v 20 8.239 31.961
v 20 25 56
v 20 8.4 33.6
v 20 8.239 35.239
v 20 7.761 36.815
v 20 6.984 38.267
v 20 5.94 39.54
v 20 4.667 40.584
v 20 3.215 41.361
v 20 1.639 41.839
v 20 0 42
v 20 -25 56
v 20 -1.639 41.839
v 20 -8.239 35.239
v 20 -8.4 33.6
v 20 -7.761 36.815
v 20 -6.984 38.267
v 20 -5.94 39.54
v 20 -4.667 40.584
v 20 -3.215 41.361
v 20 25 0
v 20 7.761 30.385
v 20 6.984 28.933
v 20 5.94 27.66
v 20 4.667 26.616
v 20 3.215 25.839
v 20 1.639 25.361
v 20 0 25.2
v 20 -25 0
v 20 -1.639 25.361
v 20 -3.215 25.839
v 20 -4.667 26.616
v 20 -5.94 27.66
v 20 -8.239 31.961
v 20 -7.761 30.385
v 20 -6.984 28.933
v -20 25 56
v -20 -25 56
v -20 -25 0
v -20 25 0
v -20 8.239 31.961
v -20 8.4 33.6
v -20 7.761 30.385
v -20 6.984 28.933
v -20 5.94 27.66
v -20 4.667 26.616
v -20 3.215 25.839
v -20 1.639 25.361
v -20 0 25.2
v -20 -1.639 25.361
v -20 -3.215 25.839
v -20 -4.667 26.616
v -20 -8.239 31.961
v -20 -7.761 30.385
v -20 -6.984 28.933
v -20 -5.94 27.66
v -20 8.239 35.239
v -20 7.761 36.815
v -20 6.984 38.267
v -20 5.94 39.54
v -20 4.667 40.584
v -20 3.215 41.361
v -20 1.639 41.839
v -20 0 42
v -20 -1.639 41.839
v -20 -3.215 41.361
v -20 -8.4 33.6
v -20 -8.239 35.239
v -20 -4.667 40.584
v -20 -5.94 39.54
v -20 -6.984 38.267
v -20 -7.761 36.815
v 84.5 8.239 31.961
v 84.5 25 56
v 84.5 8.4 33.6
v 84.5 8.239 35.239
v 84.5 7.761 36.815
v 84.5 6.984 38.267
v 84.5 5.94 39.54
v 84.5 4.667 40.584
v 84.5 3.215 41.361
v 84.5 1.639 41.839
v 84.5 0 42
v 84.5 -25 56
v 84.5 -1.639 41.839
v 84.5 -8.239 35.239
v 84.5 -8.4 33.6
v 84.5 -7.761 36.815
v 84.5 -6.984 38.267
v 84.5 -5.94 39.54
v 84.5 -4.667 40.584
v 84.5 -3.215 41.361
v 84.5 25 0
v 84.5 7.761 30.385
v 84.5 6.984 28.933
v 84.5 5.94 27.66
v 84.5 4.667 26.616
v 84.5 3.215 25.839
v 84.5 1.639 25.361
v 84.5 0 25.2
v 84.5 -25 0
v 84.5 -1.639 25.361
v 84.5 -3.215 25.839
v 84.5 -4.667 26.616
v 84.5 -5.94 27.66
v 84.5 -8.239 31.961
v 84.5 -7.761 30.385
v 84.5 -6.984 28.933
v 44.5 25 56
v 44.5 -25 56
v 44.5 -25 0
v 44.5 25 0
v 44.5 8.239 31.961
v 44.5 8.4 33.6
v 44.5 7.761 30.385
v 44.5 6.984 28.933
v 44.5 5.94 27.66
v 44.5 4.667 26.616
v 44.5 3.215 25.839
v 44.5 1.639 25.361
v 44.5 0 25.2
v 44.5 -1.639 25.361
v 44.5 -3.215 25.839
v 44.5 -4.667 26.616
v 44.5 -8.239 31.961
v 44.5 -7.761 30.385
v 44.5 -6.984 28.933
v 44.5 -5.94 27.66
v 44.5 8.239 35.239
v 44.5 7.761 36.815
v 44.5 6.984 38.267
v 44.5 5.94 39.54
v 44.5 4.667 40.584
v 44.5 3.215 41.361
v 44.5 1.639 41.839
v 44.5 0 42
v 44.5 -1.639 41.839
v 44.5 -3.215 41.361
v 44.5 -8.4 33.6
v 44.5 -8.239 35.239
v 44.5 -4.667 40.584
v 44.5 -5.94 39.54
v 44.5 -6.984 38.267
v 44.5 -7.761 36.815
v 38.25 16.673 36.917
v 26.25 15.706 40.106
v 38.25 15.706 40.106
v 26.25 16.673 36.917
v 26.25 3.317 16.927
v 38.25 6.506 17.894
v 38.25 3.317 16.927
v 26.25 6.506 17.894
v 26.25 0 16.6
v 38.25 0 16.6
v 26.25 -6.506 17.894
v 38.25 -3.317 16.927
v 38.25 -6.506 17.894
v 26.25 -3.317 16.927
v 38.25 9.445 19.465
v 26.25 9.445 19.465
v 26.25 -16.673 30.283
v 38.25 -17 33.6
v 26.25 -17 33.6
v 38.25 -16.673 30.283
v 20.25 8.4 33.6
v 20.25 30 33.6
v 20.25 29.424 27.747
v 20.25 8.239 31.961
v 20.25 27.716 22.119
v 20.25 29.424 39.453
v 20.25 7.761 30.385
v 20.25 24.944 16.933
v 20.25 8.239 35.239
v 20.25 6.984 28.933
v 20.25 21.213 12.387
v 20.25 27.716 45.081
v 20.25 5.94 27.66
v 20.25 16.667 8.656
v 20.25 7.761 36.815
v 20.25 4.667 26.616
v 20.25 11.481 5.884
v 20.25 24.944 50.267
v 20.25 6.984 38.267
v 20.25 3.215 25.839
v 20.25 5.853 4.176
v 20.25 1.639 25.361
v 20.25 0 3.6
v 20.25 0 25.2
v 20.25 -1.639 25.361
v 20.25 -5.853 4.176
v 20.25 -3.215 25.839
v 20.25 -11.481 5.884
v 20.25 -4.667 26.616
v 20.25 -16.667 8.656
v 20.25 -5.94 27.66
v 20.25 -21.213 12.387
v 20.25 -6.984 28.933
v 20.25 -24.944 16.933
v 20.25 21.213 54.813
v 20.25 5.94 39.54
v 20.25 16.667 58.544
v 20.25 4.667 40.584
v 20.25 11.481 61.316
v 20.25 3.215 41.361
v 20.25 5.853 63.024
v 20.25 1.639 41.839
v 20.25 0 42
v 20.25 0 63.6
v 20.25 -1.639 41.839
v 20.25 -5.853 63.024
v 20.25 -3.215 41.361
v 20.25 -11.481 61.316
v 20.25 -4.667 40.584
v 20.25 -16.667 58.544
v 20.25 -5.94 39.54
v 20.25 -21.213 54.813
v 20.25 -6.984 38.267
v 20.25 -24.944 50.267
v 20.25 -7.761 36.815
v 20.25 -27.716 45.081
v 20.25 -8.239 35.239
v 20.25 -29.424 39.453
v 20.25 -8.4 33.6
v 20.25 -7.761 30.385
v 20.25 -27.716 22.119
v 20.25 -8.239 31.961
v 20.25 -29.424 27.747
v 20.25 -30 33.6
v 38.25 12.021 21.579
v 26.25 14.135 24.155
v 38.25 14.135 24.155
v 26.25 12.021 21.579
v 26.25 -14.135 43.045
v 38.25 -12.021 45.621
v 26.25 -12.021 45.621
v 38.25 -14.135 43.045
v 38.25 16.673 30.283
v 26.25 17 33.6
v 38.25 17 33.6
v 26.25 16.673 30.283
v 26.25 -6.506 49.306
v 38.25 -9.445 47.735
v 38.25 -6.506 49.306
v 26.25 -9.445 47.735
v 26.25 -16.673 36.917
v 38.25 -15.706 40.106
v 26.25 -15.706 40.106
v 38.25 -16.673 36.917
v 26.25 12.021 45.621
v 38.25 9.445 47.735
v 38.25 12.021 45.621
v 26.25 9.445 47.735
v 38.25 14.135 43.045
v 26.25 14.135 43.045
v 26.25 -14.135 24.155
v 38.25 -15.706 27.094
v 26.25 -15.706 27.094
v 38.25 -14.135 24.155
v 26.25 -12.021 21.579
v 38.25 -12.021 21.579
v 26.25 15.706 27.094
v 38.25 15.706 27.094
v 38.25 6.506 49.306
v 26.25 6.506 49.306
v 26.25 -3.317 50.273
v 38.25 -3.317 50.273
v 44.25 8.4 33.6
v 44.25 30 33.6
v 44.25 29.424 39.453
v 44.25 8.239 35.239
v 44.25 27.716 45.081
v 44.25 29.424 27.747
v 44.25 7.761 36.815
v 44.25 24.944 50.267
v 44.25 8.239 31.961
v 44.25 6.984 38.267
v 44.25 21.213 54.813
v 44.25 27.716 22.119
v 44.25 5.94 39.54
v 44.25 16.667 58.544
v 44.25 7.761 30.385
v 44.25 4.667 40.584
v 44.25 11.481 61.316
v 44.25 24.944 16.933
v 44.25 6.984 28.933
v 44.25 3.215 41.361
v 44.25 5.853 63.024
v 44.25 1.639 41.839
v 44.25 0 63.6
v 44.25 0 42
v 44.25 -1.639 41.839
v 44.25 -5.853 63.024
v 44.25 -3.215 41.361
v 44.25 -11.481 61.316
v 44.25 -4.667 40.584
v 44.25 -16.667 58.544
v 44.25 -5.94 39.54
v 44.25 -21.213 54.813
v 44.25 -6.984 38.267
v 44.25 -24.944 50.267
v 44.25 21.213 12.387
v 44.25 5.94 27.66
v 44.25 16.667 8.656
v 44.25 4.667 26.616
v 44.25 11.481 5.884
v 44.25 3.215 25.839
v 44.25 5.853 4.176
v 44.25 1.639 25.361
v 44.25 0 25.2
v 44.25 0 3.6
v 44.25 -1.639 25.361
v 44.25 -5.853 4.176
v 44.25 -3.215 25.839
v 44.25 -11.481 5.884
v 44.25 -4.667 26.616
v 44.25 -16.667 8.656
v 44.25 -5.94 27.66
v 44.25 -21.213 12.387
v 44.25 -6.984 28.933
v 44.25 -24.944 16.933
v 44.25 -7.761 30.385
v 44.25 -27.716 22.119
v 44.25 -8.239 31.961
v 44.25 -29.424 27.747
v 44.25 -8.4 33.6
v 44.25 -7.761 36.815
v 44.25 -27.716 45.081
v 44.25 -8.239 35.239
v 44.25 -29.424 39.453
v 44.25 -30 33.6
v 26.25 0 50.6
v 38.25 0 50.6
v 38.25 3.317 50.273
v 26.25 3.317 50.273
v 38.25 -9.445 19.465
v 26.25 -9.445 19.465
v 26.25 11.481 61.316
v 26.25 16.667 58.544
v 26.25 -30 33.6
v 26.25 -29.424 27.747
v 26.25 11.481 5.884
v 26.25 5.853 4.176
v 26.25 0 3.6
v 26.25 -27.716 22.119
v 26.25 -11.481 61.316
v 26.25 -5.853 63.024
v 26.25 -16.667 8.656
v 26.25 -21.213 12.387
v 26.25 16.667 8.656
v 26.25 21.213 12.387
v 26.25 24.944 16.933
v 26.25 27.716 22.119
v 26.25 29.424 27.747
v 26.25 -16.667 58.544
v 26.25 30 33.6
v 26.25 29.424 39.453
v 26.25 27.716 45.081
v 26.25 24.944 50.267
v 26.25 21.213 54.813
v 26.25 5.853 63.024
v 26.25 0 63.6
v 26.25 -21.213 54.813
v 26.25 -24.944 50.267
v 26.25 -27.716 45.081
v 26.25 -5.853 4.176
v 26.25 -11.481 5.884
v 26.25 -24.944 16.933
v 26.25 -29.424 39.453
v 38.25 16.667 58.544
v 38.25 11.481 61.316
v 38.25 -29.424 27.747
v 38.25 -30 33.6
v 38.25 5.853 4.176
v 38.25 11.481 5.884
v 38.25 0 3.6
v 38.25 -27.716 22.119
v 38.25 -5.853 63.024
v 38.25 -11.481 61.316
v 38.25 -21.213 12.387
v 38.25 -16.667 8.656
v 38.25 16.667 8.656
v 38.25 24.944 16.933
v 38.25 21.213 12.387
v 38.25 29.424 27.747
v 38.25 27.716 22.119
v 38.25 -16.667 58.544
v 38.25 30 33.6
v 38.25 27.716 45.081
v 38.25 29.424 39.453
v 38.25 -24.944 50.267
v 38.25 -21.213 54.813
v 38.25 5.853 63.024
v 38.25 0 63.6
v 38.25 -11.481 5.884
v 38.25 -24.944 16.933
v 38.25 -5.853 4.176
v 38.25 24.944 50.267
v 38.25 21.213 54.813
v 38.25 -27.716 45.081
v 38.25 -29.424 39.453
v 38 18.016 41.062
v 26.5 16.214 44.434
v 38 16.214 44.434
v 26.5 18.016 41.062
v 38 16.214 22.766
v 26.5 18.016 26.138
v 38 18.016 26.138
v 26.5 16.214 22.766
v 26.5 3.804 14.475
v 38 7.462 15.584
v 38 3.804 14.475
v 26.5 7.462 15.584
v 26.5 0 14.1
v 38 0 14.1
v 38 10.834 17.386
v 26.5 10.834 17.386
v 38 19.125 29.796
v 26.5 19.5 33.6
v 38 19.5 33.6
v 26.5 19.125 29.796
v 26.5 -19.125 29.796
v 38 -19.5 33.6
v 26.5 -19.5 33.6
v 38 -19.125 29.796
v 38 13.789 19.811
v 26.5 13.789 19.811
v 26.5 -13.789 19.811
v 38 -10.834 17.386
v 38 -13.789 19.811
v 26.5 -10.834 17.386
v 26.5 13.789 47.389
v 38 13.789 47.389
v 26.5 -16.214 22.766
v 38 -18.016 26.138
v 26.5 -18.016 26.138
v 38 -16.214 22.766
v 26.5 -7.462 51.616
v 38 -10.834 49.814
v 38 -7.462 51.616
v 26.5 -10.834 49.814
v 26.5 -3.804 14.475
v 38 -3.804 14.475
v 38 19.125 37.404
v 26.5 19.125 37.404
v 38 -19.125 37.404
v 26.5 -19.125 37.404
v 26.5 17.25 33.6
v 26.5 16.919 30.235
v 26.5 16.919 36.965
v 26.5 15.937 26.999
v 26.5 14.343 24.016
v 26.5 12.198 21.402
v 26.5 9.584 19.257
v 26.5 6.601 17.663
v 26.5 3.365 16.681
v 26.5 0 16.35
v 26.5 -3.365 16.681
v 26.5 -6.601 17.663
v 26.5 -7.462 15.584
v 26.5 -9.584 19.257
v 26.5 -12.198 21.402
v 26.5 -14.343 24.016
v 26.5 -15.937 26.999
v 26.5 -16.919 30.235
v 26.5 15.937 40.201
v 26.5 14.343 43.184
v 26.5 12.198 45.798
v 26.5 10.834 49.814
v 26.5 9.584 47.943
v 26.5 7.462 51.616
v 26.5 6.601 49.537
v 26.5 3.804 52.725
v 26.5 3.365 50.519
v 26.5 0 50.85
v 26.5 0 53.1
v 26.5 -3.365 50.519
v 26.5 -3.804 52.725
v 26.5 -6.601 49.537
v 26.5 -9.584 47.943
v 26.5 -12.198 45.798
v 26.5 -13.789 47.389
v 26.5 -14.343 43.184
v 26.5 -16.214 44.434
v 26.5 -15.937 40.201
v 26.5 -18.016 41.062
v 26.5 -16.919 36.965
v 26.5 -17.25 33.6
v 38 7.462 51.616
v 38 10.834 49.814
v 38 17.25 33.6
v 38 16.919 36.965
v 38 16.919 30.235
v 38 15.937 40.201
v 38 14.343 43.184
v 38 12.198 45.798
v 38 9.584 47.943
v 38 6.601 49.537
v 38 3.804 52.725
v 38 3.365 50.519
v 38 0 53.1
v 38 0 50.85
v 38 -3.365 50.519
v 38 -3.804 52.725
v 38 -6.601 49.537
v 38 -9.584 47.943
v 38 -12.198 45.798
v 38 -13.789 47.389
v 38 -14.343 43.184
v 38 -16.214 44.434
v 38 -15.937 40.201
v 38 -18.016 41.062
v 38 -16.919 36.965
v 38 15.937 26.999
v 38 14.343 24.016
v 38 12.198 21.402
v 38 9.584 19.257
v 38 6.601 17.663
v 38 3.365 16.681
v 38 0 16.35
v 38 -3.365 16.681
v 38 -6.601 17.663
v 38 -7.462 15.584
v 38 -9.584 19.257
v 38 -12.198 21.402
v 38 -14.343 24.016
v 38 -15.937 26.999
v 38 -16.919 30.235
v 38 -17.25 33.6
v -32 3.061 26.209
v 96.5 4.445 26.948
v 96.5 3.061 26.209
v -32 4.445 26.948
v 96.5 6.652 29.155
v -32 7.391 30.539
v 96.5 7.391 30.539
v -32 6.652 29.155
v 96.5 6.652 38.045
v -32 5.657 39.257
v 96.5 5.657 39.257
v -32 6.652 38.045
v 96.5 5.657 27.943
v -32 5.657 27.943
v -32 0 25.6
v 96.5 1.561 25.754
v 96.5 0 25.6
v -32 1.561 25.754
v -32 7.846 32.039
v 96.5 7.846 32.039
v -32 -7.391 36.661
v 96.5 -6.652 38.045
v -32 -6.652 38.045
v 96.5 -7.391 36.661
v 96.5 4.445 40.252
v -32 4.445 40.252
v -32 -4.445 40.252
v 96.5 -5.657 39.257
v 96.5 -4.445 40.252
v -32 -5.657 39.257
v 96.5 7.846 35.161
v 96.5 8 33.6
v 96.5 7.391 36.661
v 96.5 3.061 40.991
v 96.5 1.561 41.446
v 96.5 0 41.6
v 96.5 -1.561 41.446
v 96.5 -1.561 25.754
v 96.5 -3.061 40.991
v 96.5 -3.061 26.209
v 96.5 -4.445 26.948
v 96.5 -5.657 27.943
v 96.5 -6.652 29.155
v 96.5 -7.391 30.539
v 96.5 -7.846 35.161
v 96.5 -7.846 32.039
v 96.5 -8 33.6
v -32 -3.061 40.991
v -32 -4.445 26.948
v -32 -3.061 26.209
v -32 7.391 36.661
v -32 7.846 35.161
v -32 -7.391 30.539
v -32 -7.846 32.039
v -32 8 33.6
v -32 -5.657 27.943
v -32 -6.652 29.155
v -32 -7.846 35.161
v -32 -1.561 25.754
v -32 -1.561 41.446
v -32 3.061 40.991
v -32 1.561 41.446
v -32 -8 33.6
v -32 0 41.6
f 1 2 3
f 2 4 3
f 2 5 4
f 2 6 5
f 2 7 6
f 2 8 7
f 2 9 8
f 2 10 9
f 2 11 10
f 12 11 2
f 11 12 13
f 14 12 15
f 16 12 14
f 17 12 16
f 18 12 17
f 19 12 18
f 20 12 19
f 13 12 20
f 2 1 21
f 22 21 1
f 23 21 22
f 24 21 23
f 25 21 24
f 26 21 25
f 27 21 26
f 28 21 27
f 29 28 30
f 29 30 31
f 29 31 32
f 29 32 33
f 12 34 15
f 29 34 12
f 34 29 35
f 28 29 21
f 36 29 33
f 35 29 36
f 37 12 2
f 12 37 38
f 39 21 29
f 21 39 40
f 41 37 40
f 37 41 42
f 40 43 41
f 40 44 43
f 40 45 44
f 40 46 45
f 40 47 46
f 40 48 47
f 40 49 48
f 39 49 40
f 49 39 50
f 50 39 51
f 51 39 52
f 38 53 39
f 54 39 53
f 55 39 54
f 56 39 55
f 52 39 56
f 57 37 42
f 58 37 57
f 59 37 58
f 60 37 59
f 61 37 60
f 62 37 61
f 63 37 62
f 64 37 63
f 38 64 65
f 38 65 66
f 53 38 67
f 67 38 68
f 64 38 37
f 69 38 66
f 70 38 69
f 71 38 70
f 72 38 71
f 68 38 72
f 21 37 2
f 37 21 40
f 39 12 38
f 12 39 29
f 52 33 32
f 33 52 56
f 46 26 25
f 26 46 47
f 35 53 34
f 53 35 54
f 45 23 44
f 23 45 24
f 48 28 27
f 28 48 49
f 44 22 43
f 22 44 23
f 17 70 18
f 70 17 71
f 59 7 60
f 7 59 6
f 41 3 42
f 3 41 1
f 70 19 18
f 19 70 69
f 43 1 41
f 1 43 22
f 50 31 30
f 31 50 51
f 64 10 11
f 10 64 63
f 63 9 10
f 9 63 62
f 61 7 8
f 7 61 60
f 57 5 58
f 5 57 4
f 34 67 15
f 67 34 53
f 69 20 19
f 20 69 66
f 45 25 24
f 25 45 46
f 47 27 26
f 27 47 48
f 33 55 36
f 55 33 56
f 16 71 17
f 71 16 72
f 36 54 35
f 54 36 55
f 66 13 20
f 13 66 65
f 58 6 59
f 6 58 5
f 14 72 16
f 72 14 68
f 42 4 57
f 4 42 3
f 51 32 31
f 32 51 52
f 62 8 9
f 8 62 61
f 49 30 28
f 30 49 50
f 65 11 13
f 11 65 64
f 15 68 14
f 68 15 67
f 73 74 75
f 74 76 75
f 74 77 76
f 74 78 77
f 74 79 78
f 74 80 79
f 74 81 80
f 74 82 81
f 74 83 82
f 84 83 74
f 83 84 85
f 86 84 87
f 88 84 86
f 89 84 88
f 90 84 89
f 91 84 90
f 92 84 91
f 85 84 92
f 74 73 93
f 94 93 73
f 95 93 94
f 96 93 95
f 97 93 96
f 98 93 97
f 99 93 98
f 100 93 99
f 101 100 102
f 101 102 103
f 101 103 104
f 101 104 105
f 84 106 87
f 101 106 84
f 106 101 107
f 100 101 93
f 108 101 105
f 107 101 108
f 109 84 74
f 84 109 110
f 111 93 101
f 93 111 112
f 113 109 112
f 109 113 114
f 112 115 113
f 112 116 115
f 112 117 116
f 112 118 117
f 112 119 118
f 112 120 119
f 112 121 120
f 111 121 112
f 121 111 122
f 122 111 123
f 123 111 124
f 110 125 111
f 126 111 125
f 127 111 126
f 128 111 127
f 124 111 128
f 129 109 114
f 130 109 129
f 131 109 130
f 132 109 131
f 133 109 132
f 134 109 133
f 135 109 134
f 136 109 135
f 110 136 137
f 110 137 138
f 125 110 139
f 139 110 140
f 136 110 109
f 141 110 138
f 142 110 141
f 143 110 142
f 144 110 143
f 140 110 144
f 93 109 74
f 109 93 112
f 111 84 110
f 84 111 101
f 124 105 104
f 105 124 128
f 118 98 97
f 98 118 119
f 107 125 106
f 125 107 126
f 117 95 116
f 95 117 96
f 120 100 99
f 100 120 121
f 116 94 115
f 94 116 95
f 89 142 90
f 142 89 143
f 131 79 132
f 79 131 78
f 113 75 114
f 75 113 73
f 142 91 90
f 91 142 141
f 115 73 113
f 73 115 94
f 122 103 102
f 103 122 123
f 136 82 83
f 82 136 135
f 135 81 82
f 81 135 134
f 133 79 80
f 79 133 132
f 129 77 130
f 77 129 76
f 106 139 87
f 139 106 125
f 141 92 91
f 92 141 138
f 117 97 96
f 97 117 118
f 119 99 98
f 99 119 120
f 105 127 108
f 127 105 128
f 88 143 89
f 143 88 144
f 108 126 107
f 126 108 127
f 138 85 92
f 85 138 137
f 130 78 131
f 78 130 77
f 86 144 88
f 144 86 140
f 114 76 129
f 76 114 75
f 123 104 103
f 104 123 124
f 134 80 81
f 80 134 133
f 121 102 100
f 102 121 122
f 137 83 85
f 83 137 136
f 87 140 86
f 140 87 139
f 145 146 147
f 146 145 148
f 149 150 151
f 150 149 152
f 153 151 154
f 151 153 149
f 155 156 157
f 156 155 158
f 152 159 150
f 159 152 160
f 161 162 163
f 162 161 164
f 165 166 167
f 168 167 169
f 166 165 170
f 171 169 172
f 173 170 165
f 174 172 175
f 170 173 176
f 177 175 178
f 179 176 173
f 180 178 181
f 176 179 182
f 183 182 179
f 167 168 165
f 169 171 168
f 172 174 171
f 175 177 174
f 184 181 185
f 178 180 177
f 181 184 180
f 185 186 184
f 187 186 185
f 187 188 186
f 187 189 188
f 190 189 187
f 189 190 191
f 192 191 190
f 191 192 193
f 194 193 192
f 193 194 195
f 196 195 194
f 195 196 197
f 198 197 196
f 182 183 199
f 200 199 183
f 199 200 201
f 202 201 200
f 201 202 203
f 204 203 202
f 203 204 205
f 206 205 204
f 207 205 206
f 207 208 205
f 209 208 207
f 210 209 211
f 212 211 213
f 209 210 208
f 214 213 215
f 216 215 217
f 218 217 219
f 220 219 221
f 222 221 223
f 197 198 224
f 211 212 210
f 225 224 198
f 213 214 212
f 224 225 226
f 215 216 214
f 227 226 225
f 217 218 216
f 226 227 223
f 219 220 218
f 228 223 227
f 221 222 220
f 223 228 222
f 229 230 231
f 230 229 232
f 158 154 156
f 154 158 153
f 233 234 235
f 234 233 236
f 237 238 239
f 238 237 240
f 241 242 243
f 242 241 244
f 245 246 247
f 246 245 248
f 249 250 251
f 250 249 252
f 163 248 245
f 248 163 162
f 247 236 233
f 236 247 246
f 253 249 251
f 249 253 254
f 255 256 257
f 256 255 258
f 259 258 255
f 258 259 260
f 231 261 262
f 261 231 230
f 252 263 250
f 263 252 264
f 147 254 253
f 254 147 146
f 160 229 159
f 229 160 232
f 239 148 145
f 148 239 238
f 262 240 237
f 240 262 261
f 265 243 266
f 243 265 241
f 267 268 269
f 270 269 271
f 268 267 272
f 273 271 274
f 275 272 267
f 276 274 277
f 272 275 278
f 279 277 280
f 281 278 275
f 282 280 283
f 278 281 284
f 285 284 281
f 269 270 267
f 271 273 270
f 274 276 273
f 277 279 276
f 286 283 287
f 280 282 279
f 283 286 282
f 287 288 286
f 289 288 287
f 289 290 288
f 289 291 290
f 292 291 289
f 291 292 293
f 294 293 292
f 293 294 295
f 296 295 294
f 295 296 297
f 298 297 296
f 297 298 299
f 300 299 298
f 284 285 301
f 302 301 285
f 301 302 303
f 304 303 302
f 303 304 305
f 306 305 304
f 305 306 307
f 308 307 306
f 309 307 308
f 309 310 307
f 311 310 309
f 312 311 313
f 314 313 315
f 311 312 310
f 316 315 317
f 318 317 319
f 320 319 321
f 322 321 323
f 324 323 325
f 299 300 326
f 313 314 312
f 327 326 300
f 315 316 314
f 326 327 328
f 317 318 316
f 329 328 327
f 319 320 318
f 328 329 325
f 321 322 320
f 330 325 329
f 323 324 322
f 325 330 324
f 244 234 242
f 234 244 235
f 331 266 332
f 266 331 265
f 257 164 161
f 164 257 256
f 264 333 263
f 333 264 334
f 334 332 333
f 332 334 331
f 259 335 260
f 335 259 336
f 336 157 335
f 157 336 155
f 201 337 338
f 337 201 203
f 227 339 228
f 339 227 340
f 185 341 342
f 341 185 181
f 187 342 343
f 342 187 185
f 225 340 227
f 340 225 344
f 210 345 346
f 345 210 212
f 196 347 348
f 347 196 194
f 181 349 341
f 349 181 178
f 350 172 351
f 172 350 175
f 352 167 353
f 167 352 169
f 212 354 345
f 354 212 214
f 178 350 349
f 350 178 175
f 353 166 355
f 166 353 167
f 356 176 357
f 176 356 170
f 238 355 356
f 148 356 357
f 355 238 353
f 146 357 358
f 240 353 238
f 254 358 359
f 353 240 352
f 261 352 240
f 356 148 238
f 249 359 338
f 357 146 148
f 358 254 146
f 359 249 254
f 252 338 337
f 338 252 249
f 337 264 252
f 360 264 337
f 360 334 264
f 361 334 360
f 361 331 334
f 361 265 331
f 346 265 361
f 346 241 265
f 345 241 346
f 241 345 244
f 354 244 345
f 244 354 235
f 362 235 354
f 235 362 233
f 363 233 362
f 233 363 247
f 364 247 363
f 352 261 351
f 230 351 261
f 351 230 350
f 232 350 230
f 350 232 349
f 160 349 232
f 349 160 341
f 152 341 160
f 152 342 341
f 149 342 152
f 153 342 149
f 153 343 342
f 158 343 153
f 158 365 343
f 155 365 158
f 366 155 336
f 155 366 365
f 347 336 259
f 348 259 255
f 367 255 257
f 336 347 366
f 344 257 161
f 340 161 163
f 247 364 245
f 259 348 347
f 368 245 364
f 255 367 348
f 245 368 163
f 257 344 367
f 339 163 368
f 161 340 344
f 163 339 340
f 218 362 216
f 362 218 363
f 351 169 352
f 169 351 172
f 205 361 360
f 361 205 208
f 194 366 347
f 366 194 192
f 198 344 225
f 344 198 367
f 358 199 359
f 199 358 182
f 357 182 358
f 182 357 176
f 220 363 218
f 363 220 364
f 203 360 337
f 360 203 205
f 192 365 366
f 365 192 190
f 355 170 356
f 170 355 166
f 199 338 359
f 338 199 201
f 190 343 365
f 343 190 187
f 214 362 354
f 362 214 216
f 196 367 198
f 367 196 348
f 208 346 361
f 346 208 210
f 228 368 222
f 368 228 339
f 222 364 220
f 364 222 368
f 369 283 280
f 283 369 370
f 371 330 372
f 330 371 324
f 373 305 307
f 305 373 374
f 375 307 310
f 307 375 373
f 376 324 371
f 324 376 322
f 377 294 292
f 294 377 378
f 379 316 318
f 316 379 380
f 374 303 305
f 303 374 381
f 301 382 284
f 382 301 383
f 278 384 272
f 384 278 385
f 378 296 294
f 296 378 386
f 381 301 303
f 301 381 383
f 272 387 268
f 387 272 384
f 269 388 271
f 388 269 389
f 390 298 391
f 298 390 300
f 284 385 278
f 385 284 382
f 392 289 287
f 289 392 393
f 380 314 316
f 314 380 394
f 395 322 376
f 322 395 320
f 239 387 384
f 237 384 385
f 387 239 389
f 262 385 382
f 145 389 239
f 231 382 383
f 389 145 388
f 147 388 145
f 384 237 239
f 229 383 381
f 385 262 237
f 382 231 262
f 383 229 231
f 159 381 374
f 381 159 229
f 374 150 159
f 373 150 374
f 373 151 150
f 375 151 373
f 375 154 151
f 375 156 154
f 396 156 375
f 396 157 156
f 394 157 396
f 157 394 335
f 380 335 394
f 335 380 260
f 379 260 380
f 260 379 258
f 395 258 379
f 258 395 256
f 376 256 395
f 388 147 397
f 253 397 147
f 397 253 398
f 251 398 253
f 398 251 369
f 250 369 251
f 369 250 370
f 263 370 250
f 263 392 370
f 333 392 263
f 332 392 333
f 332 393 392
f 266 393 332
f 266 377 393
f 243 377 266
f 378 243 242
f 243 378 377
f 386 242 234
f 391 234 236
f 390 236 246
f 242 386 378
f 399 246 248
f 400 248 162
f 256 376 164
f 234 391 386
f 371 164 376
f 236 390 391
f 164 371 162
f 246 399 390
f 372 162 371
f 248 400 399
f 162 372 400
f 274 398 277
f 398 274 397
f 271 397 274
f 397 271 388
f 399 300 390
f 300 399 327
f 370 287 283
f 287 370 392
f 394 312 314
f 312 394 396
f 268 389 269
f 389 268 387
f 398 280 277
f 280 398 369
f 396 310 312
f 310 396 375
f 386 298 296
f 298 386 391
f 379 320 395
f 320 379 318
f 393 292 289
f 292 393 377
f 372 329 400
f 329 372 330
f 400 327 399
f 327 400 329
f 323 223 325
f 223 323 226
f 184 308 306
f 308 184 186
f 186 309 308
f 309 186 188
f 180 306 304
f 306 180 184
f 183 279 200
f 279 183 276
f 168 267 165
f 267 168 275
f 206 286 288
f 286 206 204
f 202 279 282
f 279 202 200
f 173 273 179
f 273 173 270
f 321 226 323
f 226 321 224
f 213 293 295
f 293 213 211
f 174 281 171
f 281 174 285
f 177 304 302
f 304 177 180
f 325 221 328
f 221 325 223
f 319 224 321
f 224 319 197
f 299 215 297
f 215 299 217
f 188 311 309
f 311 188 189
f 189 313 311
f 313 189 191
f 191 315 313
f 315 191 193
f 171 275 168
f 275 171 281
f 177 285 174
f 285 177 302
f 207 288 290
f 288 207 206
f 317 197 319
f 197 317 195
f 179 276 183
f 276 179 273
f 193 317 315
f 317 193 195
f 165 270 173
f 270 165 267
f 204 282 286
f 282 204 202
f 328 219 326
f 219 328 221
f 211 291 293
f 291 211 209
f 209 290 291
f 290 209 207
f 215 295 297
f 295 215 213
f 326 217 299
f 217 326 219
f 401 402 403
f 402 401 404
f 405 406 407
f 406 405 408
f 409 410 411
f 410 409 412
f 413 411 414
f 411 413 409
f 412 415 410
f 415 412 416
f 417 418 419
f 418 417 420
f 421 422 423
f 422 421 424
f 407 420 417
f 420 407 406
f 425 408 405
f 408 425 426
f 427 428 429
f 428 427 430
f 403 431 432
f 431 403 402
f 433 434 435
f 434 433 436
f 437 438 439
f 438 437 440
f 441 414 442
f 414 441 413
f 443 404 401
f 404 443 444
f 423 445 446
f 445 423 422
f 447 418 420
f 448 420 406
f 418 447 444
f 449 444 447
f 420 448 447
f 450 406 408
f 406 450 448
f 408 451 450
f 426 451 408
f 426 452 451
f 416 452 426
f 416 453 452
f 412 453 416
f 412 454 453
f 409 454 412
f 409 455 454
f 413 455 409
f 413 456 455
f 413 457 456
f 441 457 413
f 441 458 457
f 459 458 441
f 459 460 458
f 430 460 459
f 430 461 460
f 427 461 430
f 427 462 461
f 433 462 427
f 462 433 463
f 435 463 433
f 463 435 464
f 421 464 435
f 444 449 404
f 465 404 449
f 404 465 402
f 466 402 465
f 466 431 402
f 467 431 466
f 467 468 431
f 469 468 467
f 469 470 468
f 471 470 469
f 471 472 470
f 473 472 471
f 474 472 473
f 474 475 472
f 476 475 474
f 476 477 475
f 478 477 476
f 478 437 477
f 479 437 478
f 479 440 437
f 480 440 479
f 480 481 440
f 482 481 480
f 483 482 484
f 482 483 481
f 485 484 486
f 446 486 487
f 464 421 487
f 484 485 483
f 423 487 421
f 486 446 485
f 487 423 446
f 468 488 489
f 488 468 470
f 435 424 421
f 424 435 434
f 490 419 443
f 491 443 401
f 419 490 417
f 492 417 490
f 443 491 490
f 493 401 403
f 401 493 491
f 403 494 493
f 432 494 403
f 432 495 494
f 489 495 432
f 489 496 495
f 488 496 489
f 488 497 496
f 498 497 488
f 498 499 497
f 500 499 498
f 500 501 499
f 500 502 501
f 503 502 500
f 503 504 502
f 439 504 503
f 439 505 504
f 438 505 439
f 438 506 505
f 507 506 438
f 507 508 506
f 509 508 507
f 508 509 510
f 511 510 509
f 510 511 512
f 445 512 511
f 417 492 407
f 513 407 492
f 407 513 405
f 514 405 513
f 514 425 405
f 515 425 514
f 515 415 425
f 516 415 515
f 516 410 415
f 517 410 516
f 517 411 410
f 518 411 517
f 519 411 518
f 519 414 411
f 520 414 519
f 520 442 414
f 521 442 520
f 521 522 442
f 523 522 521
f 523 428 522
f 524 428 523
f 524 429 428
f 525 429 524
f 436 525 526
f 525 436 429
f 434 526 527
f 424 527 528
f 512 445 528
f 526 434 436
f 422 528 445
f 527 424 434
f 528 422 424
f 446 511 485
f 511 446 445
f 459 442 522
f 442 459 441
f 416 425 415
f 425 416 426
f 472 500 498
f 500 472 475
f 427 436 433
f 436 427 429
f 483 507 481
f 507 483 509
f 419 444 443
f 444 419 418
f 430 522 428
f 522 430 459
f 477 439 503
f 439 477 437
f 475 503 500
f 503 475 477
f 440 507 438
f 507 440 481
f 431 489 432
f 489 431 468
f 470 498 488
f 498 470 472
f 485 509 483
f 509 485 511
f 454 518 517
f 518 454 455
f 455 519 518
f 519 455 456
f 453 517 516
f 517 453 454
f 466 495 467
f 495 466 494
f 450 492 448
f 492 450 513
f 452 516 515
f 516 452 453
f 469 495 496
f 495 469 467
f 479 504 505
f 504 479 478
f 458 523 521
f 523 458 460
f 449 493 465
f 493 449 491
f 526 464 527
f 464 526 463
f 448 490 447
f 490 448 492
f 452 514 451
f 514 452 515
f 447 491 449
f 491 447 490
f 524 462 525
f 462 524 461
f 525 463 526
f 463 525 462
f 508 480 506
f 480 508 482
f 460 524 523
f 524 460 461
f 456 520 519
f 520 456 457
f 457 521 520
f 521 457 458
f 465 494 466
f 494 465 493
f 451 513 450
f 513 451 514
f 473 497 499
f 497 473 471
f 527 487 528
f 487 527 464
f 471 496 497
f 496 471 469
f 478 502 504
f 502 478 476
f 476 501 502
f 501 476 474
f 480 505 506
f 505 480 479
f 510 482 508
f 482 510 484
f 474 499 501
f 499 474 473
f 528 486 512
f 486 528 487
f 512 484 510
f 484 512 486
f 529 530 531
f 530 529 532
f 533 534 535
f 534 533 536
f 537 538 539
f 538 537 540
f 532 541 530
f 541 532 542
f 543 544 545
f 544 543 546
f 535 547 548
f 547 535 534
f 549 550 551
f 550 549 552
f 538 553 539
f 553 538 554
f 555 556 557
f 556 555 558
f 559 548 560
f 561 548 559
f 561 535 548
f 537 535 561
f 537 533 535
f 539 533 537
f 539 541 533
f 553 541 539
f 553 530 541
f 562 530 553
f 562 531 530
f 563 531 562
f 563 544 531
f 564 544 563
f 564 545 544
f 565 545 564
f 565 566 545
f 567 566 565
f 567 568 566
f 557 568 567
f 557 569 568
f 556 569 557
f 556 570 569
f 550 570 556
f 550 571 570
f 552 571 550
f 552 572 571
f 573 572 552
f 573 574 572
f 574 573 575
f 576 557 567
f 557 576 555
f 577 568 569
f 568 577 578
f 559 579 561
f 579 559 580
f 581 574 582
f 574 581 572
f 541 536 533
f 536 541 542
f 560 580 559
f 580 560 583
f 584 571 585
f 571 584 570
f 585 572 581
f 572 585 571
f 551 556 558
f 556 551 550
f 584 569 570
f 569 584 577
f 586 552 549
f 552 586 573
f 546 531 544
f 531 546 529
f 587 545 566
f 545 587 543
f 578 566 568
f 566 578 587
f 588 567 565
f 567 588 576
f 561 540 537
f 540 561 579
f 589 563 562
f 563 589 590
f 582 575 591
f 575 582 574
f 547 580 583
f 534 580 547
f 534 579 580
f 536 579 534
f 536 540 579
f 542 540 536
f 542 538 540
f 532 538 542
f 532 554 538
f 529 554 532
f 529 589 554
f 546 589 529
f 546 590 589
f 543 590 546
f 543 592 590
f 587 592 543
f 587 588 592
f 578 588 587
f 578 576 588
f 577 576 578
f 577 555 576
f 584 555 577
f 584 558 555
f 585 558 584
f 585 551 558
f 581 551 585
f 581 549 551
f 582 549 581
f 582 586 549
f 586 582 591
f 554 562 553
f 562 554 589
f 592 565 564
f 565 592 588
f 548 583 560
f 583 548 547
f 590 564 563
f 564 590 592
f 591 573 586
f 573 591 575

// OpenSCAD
$fn = 32;

// ------------------------------------------------------------------------
// Pulley assembly: d60 pulley with a belt, shaft d16
// Every part is its own module, assembly() places them once.
// ------------------------------------------------------------------------

// --- part 1 ---
module support1() {
  difference() {
    translate([-20, -25, 0]) cube([40, 50, 56]);
    translate([0, 0, 33.6]) rotate([0, 90, 0]) cylinder(h = 42, d = 16.8, center = true);
  }
}

// --- part 2 ---
module support2() {
  difference() {
    translate([-20, -25, 0]) cube([40, 50, 56]);
    translate([0, 0, 33.6]) rotate([0, 90, 0]) cylinder(h = 42, d = 16.8, center = true);
  }
}

// --- part 3 ---
module shaft() {
  translate([0, 0, -64.25]) cylinder(h = 128.5, d = 16);
}

// --- part 4 ---
module pulley() {
  difference() {
    union() {
      cylinder(h = 24, d = 34);
      cylinder(h = 6, d = 60);
      translate([0, 0, 18]) cylinder(h = 6, d = 60);
    }
    translate([0, 0, -1]) cylinder(h = 26, d = 16.8);
  }
}

// --- part 5 ---
module belt() {
  difference() {
      translate([0, 0, 0]) cylinder(h = 11.5, d = 39);
      translate([0, 0, -1]) cylinder(h = 13.5, d = 34.5);
    }
}

// --- assembly ---
module assembly() {
  translate([0, 0, 0]) rotate([0, 0, 0]) support1();
  translate([64.5, 0, 0]) rotate([0, 0, 0]) support2();
  translate([32.25, 0, 33.6]) rotate([0, 90, 0]) shaft();
  translate([20.25, 0, 33.6]) rotate([0, 90, 0]) pulley();
  translate([26.5, 0, 33.6]) rotate([0, 90, 0]) belt();
}

assembly();
